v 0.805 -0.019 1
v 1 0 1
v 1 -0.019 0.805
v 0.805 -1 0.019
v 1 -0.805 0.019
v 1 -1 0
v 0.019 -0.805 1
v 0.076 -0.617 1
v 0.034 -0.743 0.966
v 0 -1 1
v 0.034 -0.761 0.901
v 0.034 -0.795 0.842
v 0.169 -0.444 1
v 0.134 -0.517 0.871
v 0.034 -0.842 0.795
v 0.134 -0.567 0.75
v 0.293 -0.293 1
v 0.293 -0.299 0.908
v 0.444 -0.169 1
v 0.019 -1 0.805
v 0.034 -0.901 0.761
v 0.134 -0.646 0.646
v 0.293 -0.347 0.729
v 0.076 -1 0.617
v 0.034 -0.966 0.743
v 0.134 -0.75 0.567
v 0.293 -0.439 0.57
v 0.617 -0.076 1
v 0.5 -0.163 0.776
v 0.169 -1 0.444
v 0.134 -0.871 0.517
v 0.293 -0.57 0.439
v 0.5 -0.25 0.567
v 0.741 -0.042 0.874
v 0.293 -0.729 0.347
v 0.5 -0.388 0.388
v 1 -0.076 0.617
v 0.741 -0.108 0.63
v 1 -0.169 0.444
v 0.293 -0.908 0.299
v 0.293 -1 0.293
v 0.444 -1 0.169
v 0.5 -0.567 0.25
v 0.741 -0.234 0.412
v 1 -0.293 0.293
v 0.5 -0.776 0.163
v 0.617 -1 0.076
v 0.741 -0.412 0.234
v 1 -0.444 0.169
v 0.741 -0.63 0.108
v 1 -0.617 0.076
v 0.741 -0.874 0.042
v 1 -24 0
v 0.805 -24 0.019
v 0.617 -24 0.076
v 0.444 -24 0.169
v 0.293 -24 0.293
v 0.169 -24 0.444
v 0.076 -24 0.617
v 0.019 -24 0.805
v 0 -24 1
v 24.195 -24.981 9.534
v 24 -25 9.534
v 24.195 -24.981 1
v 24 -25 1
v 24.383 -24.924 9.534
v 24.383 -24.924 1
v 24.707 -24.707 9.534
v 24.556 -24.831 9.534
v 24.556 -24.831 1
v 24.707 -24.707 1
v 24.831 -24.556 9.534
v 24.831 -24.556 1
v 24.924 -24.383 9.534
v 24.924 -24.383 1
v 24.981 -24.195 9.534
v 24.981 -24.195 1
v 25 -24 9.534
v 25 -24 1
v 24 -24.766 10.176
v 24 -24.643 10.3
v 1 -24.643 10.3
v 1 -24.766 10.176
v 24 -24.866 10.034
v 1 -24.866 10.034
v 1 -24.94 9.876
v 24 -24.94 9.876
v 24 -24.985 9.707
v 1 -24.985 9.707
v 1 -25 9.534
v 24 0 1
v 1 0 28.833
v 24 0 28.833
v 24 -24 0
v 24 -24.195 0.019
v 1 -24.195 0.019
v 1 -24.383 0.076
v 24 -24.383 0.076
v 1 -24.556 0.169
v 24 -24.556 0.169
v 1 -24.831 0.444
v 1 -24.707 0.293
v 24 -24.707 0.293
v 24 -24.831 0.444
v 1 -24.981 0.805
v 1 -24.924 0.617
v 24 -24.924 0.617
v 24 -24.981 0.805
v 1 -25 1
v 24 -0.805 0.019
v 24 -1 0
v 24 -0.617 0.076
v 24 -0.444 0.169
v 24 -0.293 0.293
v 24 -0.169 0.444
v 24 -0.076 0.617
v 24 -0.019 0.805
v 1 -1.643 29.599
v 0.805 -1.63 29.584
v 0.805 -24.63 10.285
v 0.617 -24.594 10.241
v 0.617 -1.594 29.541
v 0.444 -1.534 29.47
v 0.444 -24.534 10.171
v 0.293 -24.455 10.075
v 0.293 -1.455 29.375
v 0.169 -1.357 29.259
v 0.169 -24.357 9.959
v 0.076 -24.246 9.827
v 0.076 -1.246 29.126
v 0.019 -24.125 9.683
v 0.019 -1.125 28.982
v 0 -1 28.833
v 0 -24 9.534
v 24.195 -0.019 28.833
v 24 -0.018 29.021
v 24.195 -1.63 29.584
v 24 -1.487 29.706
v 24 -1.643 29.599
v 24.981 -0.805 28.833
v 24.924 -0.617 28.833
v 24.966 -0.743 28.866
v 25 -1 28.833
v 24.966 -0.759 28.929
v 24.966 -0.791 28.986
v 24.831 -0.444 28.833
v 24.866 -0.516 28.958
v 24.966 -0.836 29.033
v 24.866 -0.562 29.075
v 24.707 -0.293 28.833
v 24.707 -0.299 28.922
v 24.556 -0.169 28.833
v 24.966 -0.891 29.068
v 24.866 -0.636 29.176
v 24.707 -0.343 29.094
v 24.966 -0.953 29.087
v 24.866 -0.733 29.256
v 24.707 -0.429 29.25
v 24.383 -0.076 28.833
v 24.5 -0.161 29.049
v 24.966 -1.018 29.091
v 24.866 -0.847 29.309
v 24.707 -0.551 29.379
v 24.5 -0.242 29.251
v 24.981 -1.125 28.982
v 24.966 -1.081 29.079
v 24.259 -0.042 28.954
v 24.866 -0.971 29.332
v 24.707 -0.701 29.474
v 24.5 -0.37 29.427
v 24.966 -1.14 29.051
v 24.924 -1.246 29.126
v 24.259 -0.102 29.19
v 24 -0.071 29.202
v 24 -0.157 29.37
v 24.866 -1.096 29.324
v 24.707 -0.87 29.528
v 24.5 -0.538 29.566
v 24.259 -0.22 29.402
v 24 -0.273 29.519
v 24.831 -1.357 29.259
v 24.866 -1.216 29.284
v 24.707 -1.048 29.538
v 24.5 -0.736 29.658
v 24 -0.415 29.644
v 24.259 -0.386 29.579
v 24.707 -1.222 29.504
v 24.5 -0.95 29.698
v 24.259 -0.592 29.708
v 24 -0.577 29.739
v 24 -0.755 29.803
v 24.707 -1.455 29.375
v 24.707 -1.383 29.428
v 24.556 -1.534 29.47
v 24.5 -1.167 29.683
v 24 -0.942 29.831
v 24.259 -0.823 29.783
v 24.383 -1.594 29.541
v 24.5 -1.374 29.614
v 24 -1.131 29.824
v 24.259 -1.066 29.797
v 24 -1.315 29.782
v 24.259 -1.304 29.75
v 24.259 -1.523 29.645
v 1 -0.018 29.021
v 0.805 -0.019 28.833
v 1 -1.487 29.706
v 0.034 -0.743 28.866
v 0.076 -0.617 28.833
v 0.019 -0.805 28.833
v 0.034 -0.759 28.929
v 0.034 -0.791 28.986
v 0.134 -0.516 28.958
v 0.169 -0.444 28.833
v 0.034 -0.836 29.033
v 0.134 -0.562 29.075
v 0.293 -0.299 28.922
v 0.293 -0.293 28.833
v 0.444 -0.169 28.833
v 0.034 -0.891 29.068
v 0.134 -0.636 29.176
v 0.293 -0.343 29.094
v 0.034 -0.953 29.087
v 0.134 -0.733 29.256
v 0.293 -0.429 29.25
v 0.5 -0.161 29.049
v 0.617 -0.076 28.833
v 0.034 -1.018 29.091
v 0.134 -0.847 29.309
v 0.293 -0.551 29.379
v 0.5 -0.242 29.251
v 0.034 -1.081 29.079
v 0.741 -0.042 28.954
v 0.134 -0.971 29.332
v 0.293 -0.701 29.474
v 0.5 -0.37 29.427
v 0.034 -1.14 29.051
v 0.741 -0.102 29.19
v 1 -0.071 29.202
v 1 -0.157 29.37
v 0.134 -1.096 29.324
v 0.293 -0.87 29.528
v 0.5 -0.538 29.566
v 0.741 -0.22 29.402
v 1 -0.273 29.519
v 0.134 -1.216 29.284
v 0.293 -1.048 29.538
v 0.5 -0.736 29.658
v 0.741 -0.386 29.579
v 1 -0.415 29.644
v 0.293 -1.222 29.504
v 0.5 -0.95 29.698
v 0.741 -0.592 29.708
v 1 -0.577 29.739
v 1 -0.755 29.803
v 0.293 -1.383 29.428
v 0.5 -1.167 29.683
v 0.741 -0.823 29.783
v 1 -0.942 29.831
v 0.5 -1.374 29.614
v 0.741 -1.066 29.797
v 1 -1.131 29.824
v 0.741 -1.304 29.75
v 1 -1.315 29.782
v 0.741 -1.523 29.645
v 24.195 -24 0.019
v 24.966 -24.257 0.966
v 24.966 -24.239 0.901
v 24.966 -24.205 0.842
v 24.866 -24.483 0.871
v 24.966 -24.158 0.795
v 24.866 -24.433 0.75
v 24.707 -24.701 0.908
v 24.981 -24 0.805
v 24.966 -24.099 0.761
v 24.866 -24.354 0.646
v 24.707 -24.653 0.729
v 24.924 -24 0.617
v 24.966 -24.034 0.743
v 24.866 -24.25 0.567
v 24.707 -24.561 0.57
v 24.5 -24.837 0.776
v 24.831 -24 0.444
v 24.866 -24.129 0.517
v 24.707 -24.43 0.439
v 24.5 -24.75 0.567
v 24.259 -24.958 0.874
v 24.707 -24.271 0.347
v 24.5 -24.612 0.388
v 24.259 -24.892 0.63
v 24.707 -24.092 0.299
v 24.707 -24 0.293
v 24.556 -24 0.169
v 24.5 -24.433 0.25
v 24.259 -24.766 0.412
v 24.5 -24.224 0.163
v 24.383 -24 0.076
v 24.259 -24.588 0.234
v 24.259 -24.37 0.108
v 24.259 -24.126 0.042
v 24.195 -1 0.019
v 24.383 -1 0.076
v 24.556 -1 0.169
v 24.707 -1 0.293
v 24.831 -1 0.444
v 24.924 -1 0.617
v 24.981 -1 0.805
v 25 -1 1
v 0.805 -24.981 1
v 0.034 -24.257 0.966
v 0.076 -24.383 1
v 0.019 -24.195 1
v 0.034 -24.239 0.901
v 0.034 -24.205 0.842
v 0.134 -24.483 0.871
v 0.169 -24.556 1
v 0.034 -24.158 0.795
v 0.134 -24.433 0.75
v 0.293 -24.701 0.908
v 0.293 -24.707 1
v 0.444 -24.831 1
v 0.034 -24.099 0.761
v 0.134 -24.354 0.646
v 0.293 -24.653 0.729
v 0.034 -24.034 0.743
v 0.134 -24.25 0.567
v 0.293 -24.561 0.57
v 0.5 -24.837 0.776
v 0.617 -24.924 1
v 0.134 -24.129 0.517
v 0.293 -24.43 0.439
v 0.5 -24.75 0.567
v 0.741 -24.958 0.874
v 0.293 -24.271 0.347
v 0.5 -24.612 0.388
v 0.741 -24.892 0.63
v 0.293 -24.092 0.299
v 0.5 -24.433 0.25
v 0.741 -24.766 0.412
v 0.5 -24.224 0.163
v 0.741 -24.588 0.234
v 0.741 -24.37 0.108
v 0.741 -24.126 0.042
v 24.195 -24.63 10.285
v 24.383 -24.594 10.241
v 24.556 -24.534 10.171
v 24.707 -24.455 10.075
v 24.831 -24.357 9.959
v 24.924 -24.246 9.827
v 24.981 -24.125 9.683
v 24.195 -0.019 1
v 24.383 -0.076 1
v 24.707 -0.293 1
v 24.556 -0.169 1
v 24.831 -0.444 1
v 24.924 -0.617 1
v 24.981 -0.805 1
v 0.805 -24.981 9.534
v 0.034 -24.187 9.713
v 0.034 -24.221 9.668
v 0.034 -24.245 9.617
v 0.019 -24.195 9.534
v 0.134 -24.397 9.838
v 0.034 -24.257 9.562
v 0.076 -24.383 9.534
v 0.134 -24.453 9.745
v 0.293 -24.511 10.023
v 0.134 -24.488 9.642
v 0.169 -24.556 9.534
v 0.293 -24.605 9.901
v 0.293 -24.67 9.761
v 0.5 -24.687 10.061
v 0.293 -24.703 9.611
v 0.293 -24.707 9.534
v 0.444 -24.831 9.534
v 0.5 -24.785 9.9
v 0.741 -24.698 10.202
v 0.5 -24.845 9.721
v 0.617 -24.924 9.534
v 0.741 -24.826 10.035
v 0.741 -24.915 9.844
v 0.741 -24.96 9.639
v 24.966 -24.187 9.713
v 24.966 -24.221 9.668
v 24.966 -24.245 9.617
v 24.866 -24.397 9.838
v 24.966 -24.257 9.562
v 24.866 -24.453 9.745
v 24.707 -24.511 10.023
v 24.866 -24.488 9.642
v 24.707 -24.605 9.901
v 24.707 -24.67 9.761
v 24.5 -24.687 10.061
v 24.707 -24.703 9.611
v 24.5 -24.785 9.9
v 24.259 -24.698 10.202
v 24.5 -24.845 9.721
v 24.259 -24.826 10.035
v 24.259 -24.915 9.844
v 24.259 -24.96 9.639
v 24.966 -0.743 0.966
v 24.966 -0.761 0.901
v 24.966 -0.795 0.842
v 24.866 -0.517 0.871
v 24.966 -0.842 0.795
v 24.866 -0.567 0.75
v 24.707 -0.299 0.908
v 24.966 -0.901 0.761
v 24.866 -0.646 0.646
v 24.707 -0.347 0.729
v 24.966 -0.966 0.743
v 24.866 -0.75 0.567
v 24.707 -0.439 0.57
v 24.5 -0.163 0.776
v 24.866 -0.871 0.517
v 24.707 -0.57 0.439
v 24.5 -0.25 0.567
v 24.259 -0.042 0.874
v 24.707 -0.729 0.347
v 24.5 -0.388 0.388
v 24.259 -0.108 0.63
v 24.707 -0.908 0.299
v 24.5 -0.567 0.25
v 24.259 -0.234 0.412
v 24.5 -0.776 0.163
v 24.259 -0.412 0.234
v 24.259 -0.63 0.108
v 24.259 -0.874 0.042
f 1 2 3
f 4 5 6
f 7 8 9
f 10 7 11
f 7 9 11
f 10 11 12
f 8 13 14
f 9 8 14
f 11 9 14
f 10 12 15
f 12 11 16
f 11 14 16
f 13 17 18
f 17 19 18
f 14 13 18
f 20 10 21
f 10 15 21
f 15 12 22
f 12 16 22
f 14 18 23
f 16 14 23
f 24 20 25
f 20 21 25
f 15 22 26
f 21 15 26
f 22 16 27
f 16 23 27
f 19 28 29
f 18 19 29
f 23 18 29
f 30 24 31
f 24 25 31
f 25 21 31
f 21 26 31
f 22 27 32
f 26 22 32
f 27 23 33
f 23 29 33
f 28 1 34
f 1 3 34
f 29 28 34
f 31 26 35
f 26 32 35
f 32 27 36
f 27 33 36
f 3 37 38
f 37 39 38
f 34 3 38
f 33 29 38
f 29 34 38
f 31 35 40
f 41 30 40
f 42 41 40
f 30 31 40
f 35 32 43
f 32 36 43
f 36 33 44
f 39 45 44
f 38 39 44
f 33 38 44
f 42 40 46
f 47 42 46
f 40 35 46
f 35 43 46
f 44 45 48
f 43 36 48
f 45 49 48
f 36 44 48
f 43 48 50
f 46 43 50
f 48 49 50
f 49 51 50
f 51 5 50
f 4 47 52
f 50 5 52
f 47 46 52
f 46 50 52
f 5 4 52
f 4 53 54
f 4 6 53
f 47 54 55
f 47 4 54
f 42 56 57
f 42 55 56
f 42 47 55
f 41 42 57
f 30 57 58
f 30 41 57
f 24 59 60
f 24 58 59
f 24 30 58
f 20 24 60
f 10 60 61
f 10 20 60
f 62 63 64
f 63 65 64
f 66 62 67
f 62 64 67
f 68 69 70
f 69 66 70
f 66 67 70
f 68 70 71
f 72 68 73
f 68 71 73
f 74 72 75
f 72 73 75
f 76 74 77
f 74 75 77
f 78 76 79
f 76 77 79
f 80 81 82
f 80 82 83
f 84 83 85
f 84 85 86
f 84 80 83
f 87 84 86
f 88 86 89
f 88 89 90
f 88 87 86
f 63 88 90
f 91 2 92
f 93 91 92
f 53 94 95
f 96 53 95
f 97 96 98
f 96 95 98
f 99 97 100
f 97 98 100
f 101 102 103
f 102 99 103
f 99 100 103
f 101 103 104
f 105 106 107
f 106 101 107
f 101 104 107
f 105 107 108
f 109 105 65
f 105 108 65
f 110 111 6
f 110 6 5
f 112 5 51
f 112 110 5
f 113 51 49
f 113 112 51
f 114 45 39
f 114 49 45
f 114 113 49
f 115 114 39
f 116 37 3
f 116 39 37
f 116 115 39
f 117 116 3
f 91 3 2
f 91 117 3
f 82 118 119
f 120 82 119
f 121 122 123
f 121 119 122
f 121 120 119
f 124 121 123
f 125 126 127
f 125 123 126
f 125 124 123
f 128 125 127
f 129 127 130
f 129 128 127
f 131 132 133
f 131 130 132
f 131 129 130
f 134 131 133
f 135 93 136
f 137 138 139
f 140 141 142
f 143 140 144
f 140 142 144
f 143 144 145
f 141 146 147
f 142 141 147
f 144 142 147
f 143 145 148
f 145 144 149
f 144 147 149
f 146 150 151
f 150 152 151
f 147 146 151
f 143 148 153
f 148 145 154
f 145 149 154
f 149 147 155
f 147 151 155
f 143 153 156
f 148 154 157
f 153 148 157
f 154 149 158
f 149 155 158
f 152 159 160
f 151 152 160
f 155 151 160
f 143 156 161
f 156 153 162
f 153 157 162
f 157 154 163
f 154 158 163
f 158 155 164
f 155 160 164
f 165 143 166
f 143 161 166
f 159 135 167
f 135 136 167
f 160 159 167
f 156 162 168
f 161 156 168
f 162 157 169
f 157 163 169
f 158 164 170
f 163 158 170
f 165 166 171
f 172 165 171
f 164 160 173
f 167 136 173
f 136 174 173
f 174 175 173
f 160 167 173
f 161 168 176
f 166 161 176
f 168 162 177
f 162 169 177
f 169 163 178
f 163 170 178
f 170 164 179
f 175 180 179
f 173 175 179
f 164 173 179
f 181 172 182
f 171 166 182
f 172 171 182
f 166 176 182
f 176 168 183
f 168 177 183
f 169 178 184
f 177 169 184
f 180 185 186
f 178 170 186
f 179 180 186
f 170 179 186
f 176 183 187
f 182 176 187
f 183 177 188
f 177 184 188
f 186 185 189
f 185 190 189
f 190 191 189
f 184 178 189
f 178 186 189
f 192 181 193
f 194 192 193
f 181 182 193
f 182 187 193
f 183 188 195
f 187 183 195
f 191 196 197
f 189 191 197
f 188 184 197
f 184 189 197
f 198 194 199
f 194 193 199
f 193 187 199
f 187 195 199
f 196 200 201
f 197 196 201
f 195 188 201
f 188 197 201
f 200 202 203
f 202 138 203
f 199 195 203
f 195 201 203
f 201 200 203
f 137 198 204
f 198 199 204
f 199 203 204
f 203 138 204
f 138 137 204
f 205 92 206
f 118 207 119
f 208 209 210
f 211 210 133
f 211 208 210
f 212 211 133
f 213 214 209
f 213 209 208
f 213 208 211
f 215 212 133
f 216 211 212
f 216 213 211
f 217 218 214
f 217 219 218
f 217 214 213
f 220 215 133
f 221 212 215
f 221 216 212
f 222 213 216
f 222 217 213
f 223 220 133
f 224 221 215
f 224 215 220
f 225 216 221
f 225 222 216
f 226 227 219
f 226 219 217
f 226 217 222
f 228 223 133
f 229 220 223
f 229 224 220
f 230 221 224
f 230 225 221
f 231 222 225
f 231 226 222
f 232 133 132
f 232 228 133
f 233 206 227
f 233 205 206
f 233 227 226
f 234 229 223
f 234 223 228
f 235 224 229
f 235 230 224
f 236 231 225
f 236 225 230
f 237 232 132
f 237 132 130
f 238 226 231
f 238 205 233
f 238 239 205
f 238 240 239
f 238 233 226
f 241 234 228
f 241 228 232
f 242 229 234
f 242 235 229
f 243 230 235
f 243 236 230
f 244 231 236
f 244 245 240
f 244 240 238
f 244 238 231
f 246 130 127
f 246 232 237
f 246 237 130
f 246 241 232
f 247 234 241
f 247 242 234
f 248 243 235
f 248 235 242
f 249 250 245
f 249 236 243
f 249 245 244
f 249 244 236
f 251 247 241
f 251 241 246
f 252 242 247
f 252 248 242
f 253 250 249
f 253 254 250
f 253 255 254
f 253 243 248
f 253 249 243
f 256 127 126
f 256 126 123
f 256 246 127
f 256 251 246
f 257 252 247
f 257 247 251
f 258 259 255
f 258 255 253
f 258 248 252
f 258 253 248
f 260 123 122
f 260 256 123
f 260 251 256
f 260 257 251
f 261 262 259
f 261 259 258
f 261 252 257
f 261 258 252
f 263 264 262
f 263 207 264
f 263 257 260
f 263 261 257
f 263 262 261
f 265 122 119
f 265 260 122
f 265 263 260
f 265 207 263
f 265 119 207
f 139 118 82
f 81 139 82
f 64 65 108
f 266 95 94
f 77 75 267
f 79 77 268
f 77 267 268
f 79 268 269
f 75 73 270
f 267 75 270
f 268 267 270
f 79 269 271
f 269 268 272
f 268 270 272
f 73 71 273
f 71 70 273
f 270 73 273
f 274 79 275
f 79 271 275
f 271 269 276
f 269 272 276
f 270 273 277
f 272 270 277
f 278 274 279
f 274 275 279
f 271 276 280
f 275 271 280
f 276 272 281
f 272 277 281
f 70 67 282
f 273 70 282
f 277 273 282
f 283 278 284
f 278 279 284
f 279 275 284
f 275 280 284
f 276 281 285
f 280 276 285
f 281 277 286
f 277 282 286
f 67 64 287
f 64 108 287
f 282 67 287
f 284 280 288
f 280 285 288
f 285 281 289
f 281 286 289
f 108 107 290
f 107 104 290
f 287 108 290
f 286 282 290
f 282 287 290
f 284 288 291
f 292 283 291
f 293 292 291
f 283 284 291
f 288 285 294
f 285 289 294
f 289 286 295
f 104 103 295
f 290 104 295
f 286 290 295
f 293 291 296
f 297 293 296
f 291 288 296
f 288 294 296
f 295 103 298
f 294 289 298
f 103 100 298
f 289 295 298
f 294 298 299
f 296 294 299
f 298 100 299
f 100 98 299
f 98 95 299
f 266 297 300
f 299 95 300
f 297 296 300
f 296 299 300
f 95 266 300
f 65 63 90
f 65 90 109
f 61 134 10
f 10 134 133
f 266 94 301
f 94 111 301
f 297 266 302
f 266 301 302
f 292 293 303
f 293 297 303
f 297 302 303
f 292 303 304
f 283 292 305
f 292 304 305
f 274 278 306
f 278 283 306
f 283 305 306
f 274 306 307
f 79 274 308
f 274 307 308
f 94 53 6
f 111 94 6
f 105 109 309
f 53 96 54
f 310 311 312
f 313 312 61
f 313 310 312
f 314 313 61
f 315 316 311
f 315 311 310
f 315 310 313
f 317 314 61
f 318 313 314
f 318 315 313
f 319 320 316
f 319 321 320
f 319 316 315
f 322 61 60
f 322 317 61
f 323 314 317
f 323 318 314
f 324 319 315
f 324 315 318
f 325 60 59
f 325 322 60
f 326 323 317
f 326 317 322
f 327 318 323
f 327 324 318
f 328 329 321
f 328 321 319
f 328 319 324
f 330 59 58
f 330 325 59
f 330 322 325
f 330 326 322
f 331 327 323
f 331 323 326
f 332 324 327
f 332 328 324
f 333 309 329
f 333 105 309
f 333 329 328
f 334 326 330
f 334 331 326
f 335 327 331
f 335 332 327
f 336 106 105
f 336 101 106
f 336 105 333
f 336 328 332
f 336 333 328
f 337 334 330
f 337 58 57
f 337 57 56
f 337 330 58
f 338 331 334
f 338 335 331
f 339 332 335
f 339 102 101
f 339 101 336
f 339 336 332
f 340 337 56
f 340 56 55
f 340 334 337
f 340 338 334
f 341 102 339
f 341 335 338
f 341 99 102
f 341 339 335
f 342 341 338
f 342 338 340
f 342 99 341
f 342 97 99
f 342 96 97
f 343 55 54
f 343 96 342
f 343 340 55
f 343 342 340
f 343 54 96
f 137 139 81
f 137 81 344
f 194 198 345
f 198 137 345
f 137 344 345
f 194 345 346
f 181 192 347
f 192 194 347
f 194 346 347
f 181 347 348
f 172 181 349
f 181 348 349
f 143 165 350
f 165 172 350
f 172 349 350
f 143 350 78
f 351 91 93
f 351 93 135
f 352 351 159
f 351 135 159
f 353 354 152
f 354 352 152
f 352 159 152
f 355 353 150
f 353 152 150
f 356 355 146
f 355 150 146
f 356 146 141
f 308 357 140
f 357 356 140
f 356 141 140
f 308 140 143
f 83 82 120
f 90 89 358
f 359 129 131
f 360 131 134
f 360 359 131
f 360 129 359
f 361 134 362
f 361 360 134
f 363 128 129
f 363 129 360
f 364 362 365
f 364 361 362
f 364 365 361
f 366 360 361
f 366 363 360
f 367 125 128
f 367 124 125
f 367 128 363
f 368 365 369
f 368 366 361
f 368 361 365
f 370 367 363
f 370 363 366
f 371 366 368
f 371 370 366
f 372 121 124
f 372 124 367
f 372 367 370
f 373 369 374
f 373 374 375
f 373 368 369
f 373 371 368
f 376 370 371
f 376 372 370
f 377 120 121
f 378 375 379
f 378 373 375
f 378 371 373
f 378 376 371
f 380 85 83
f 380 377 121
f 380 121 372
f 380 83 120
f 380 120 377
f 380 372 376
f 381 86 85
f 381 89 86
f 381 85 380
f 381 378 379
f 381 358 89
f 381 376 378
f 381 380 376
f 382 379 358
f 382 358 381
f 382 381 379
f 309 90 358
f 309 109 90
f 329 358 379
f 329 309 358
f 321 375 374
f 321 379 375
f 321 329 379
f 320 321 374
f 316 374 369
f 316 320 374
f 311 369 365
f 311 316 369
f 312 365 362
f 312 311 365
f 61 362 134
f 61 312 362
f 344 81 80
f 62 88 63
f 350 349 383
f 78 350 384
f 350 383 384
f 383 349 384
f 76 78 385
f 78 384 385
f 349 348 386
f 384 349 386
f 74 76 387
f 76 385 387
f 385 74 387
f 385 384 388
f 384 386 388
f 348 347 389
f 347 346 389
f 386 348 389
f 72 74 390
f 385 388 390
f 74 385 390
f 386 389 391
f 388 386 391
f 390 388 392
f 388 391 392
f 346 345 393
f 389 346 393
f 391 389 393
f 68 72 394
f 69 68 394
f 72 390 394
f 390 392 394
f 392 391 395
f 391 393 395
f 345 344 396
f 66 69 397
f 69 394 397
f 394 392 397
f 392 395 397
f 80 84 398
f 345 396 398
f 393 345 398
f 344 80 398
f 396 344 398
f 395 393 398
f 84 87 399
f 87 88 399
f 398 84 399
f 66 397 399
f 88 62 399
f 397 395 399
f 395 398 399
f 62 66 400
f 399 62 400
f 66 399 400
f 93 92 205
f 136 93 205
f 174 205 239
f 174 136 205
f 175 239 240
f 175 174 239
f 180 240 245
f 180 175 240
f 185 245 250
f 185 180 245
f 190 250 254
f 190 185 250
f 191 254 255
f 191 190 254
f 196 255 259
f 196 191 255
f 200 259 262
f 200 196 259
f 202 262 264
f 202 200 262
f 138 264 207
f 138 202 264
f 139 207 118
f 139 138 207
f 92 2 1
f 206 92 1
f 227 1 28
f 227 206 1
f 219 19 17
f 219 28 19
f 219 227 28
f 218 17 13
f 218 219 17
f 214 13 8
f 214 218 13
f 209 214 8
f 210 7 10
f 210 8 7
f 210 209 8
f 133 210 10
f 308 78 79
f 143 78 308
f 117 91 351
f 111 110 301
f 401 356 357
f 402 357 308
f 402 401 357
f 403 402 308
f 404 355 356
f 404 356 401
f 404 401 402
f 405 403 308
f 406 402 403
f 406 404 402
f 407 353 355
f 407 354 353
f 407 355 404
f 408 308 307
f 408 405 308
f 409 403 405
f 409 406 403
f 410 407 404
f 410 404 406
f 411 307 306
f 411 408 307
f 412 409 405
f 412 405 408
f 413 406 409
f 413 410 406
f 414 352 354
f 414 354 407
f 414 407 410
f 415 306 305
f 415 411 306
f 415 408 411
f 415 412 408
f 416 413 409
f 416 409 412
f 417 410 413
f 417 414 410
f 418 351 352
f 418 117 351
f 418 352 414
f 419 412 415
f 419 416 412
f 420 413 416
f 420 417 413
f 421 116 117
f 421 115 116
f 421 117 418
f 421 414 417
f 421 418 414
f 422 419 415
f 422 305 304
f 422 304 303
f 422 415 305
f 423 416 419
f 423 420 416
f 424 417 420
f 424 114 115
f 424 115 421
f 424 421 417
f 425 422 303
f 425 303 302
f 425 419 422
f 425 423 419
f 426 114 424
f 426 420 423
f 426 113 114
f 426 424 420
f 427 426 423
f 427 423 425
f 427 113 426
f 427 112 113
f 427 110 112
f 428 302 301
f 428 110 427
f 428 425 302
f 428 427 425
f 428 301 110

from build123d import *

# Parameters (mm, degrees)
F1_DEPTH = 25
F2_R     = 1


with BuildPart() as f1:
    # F0 (on Right) → F1 (new body)
    with BuildSketch(Plane.YZ):
        Polygon((-25, 0), (0, 0), (0, 30.977491), (-25, 10), align=None)
    extrude(amount=F1_DEPTH)

    # F2
    f2_edges = [f1.edges().sort_by_distance(p)[0] for p in [
        (12.5, 0, 0),
        (12.5, 0, 30.977491),
        (0, 0, 15.488745),
        (25, 0, 15.488745),
        (12.5, -25, 10),
        (0, -12.5, 20.488745),
        (25, -12.5, 20.488745),
        (12.5, -25, 0),
        (0, -25, 5),
        (25, -25, 5),
        (25, -12.5, 0),
        (0, -12.5, 0),
    ]]
    fillet(f2_edges, radius=F2_R)


solid = f1.part
